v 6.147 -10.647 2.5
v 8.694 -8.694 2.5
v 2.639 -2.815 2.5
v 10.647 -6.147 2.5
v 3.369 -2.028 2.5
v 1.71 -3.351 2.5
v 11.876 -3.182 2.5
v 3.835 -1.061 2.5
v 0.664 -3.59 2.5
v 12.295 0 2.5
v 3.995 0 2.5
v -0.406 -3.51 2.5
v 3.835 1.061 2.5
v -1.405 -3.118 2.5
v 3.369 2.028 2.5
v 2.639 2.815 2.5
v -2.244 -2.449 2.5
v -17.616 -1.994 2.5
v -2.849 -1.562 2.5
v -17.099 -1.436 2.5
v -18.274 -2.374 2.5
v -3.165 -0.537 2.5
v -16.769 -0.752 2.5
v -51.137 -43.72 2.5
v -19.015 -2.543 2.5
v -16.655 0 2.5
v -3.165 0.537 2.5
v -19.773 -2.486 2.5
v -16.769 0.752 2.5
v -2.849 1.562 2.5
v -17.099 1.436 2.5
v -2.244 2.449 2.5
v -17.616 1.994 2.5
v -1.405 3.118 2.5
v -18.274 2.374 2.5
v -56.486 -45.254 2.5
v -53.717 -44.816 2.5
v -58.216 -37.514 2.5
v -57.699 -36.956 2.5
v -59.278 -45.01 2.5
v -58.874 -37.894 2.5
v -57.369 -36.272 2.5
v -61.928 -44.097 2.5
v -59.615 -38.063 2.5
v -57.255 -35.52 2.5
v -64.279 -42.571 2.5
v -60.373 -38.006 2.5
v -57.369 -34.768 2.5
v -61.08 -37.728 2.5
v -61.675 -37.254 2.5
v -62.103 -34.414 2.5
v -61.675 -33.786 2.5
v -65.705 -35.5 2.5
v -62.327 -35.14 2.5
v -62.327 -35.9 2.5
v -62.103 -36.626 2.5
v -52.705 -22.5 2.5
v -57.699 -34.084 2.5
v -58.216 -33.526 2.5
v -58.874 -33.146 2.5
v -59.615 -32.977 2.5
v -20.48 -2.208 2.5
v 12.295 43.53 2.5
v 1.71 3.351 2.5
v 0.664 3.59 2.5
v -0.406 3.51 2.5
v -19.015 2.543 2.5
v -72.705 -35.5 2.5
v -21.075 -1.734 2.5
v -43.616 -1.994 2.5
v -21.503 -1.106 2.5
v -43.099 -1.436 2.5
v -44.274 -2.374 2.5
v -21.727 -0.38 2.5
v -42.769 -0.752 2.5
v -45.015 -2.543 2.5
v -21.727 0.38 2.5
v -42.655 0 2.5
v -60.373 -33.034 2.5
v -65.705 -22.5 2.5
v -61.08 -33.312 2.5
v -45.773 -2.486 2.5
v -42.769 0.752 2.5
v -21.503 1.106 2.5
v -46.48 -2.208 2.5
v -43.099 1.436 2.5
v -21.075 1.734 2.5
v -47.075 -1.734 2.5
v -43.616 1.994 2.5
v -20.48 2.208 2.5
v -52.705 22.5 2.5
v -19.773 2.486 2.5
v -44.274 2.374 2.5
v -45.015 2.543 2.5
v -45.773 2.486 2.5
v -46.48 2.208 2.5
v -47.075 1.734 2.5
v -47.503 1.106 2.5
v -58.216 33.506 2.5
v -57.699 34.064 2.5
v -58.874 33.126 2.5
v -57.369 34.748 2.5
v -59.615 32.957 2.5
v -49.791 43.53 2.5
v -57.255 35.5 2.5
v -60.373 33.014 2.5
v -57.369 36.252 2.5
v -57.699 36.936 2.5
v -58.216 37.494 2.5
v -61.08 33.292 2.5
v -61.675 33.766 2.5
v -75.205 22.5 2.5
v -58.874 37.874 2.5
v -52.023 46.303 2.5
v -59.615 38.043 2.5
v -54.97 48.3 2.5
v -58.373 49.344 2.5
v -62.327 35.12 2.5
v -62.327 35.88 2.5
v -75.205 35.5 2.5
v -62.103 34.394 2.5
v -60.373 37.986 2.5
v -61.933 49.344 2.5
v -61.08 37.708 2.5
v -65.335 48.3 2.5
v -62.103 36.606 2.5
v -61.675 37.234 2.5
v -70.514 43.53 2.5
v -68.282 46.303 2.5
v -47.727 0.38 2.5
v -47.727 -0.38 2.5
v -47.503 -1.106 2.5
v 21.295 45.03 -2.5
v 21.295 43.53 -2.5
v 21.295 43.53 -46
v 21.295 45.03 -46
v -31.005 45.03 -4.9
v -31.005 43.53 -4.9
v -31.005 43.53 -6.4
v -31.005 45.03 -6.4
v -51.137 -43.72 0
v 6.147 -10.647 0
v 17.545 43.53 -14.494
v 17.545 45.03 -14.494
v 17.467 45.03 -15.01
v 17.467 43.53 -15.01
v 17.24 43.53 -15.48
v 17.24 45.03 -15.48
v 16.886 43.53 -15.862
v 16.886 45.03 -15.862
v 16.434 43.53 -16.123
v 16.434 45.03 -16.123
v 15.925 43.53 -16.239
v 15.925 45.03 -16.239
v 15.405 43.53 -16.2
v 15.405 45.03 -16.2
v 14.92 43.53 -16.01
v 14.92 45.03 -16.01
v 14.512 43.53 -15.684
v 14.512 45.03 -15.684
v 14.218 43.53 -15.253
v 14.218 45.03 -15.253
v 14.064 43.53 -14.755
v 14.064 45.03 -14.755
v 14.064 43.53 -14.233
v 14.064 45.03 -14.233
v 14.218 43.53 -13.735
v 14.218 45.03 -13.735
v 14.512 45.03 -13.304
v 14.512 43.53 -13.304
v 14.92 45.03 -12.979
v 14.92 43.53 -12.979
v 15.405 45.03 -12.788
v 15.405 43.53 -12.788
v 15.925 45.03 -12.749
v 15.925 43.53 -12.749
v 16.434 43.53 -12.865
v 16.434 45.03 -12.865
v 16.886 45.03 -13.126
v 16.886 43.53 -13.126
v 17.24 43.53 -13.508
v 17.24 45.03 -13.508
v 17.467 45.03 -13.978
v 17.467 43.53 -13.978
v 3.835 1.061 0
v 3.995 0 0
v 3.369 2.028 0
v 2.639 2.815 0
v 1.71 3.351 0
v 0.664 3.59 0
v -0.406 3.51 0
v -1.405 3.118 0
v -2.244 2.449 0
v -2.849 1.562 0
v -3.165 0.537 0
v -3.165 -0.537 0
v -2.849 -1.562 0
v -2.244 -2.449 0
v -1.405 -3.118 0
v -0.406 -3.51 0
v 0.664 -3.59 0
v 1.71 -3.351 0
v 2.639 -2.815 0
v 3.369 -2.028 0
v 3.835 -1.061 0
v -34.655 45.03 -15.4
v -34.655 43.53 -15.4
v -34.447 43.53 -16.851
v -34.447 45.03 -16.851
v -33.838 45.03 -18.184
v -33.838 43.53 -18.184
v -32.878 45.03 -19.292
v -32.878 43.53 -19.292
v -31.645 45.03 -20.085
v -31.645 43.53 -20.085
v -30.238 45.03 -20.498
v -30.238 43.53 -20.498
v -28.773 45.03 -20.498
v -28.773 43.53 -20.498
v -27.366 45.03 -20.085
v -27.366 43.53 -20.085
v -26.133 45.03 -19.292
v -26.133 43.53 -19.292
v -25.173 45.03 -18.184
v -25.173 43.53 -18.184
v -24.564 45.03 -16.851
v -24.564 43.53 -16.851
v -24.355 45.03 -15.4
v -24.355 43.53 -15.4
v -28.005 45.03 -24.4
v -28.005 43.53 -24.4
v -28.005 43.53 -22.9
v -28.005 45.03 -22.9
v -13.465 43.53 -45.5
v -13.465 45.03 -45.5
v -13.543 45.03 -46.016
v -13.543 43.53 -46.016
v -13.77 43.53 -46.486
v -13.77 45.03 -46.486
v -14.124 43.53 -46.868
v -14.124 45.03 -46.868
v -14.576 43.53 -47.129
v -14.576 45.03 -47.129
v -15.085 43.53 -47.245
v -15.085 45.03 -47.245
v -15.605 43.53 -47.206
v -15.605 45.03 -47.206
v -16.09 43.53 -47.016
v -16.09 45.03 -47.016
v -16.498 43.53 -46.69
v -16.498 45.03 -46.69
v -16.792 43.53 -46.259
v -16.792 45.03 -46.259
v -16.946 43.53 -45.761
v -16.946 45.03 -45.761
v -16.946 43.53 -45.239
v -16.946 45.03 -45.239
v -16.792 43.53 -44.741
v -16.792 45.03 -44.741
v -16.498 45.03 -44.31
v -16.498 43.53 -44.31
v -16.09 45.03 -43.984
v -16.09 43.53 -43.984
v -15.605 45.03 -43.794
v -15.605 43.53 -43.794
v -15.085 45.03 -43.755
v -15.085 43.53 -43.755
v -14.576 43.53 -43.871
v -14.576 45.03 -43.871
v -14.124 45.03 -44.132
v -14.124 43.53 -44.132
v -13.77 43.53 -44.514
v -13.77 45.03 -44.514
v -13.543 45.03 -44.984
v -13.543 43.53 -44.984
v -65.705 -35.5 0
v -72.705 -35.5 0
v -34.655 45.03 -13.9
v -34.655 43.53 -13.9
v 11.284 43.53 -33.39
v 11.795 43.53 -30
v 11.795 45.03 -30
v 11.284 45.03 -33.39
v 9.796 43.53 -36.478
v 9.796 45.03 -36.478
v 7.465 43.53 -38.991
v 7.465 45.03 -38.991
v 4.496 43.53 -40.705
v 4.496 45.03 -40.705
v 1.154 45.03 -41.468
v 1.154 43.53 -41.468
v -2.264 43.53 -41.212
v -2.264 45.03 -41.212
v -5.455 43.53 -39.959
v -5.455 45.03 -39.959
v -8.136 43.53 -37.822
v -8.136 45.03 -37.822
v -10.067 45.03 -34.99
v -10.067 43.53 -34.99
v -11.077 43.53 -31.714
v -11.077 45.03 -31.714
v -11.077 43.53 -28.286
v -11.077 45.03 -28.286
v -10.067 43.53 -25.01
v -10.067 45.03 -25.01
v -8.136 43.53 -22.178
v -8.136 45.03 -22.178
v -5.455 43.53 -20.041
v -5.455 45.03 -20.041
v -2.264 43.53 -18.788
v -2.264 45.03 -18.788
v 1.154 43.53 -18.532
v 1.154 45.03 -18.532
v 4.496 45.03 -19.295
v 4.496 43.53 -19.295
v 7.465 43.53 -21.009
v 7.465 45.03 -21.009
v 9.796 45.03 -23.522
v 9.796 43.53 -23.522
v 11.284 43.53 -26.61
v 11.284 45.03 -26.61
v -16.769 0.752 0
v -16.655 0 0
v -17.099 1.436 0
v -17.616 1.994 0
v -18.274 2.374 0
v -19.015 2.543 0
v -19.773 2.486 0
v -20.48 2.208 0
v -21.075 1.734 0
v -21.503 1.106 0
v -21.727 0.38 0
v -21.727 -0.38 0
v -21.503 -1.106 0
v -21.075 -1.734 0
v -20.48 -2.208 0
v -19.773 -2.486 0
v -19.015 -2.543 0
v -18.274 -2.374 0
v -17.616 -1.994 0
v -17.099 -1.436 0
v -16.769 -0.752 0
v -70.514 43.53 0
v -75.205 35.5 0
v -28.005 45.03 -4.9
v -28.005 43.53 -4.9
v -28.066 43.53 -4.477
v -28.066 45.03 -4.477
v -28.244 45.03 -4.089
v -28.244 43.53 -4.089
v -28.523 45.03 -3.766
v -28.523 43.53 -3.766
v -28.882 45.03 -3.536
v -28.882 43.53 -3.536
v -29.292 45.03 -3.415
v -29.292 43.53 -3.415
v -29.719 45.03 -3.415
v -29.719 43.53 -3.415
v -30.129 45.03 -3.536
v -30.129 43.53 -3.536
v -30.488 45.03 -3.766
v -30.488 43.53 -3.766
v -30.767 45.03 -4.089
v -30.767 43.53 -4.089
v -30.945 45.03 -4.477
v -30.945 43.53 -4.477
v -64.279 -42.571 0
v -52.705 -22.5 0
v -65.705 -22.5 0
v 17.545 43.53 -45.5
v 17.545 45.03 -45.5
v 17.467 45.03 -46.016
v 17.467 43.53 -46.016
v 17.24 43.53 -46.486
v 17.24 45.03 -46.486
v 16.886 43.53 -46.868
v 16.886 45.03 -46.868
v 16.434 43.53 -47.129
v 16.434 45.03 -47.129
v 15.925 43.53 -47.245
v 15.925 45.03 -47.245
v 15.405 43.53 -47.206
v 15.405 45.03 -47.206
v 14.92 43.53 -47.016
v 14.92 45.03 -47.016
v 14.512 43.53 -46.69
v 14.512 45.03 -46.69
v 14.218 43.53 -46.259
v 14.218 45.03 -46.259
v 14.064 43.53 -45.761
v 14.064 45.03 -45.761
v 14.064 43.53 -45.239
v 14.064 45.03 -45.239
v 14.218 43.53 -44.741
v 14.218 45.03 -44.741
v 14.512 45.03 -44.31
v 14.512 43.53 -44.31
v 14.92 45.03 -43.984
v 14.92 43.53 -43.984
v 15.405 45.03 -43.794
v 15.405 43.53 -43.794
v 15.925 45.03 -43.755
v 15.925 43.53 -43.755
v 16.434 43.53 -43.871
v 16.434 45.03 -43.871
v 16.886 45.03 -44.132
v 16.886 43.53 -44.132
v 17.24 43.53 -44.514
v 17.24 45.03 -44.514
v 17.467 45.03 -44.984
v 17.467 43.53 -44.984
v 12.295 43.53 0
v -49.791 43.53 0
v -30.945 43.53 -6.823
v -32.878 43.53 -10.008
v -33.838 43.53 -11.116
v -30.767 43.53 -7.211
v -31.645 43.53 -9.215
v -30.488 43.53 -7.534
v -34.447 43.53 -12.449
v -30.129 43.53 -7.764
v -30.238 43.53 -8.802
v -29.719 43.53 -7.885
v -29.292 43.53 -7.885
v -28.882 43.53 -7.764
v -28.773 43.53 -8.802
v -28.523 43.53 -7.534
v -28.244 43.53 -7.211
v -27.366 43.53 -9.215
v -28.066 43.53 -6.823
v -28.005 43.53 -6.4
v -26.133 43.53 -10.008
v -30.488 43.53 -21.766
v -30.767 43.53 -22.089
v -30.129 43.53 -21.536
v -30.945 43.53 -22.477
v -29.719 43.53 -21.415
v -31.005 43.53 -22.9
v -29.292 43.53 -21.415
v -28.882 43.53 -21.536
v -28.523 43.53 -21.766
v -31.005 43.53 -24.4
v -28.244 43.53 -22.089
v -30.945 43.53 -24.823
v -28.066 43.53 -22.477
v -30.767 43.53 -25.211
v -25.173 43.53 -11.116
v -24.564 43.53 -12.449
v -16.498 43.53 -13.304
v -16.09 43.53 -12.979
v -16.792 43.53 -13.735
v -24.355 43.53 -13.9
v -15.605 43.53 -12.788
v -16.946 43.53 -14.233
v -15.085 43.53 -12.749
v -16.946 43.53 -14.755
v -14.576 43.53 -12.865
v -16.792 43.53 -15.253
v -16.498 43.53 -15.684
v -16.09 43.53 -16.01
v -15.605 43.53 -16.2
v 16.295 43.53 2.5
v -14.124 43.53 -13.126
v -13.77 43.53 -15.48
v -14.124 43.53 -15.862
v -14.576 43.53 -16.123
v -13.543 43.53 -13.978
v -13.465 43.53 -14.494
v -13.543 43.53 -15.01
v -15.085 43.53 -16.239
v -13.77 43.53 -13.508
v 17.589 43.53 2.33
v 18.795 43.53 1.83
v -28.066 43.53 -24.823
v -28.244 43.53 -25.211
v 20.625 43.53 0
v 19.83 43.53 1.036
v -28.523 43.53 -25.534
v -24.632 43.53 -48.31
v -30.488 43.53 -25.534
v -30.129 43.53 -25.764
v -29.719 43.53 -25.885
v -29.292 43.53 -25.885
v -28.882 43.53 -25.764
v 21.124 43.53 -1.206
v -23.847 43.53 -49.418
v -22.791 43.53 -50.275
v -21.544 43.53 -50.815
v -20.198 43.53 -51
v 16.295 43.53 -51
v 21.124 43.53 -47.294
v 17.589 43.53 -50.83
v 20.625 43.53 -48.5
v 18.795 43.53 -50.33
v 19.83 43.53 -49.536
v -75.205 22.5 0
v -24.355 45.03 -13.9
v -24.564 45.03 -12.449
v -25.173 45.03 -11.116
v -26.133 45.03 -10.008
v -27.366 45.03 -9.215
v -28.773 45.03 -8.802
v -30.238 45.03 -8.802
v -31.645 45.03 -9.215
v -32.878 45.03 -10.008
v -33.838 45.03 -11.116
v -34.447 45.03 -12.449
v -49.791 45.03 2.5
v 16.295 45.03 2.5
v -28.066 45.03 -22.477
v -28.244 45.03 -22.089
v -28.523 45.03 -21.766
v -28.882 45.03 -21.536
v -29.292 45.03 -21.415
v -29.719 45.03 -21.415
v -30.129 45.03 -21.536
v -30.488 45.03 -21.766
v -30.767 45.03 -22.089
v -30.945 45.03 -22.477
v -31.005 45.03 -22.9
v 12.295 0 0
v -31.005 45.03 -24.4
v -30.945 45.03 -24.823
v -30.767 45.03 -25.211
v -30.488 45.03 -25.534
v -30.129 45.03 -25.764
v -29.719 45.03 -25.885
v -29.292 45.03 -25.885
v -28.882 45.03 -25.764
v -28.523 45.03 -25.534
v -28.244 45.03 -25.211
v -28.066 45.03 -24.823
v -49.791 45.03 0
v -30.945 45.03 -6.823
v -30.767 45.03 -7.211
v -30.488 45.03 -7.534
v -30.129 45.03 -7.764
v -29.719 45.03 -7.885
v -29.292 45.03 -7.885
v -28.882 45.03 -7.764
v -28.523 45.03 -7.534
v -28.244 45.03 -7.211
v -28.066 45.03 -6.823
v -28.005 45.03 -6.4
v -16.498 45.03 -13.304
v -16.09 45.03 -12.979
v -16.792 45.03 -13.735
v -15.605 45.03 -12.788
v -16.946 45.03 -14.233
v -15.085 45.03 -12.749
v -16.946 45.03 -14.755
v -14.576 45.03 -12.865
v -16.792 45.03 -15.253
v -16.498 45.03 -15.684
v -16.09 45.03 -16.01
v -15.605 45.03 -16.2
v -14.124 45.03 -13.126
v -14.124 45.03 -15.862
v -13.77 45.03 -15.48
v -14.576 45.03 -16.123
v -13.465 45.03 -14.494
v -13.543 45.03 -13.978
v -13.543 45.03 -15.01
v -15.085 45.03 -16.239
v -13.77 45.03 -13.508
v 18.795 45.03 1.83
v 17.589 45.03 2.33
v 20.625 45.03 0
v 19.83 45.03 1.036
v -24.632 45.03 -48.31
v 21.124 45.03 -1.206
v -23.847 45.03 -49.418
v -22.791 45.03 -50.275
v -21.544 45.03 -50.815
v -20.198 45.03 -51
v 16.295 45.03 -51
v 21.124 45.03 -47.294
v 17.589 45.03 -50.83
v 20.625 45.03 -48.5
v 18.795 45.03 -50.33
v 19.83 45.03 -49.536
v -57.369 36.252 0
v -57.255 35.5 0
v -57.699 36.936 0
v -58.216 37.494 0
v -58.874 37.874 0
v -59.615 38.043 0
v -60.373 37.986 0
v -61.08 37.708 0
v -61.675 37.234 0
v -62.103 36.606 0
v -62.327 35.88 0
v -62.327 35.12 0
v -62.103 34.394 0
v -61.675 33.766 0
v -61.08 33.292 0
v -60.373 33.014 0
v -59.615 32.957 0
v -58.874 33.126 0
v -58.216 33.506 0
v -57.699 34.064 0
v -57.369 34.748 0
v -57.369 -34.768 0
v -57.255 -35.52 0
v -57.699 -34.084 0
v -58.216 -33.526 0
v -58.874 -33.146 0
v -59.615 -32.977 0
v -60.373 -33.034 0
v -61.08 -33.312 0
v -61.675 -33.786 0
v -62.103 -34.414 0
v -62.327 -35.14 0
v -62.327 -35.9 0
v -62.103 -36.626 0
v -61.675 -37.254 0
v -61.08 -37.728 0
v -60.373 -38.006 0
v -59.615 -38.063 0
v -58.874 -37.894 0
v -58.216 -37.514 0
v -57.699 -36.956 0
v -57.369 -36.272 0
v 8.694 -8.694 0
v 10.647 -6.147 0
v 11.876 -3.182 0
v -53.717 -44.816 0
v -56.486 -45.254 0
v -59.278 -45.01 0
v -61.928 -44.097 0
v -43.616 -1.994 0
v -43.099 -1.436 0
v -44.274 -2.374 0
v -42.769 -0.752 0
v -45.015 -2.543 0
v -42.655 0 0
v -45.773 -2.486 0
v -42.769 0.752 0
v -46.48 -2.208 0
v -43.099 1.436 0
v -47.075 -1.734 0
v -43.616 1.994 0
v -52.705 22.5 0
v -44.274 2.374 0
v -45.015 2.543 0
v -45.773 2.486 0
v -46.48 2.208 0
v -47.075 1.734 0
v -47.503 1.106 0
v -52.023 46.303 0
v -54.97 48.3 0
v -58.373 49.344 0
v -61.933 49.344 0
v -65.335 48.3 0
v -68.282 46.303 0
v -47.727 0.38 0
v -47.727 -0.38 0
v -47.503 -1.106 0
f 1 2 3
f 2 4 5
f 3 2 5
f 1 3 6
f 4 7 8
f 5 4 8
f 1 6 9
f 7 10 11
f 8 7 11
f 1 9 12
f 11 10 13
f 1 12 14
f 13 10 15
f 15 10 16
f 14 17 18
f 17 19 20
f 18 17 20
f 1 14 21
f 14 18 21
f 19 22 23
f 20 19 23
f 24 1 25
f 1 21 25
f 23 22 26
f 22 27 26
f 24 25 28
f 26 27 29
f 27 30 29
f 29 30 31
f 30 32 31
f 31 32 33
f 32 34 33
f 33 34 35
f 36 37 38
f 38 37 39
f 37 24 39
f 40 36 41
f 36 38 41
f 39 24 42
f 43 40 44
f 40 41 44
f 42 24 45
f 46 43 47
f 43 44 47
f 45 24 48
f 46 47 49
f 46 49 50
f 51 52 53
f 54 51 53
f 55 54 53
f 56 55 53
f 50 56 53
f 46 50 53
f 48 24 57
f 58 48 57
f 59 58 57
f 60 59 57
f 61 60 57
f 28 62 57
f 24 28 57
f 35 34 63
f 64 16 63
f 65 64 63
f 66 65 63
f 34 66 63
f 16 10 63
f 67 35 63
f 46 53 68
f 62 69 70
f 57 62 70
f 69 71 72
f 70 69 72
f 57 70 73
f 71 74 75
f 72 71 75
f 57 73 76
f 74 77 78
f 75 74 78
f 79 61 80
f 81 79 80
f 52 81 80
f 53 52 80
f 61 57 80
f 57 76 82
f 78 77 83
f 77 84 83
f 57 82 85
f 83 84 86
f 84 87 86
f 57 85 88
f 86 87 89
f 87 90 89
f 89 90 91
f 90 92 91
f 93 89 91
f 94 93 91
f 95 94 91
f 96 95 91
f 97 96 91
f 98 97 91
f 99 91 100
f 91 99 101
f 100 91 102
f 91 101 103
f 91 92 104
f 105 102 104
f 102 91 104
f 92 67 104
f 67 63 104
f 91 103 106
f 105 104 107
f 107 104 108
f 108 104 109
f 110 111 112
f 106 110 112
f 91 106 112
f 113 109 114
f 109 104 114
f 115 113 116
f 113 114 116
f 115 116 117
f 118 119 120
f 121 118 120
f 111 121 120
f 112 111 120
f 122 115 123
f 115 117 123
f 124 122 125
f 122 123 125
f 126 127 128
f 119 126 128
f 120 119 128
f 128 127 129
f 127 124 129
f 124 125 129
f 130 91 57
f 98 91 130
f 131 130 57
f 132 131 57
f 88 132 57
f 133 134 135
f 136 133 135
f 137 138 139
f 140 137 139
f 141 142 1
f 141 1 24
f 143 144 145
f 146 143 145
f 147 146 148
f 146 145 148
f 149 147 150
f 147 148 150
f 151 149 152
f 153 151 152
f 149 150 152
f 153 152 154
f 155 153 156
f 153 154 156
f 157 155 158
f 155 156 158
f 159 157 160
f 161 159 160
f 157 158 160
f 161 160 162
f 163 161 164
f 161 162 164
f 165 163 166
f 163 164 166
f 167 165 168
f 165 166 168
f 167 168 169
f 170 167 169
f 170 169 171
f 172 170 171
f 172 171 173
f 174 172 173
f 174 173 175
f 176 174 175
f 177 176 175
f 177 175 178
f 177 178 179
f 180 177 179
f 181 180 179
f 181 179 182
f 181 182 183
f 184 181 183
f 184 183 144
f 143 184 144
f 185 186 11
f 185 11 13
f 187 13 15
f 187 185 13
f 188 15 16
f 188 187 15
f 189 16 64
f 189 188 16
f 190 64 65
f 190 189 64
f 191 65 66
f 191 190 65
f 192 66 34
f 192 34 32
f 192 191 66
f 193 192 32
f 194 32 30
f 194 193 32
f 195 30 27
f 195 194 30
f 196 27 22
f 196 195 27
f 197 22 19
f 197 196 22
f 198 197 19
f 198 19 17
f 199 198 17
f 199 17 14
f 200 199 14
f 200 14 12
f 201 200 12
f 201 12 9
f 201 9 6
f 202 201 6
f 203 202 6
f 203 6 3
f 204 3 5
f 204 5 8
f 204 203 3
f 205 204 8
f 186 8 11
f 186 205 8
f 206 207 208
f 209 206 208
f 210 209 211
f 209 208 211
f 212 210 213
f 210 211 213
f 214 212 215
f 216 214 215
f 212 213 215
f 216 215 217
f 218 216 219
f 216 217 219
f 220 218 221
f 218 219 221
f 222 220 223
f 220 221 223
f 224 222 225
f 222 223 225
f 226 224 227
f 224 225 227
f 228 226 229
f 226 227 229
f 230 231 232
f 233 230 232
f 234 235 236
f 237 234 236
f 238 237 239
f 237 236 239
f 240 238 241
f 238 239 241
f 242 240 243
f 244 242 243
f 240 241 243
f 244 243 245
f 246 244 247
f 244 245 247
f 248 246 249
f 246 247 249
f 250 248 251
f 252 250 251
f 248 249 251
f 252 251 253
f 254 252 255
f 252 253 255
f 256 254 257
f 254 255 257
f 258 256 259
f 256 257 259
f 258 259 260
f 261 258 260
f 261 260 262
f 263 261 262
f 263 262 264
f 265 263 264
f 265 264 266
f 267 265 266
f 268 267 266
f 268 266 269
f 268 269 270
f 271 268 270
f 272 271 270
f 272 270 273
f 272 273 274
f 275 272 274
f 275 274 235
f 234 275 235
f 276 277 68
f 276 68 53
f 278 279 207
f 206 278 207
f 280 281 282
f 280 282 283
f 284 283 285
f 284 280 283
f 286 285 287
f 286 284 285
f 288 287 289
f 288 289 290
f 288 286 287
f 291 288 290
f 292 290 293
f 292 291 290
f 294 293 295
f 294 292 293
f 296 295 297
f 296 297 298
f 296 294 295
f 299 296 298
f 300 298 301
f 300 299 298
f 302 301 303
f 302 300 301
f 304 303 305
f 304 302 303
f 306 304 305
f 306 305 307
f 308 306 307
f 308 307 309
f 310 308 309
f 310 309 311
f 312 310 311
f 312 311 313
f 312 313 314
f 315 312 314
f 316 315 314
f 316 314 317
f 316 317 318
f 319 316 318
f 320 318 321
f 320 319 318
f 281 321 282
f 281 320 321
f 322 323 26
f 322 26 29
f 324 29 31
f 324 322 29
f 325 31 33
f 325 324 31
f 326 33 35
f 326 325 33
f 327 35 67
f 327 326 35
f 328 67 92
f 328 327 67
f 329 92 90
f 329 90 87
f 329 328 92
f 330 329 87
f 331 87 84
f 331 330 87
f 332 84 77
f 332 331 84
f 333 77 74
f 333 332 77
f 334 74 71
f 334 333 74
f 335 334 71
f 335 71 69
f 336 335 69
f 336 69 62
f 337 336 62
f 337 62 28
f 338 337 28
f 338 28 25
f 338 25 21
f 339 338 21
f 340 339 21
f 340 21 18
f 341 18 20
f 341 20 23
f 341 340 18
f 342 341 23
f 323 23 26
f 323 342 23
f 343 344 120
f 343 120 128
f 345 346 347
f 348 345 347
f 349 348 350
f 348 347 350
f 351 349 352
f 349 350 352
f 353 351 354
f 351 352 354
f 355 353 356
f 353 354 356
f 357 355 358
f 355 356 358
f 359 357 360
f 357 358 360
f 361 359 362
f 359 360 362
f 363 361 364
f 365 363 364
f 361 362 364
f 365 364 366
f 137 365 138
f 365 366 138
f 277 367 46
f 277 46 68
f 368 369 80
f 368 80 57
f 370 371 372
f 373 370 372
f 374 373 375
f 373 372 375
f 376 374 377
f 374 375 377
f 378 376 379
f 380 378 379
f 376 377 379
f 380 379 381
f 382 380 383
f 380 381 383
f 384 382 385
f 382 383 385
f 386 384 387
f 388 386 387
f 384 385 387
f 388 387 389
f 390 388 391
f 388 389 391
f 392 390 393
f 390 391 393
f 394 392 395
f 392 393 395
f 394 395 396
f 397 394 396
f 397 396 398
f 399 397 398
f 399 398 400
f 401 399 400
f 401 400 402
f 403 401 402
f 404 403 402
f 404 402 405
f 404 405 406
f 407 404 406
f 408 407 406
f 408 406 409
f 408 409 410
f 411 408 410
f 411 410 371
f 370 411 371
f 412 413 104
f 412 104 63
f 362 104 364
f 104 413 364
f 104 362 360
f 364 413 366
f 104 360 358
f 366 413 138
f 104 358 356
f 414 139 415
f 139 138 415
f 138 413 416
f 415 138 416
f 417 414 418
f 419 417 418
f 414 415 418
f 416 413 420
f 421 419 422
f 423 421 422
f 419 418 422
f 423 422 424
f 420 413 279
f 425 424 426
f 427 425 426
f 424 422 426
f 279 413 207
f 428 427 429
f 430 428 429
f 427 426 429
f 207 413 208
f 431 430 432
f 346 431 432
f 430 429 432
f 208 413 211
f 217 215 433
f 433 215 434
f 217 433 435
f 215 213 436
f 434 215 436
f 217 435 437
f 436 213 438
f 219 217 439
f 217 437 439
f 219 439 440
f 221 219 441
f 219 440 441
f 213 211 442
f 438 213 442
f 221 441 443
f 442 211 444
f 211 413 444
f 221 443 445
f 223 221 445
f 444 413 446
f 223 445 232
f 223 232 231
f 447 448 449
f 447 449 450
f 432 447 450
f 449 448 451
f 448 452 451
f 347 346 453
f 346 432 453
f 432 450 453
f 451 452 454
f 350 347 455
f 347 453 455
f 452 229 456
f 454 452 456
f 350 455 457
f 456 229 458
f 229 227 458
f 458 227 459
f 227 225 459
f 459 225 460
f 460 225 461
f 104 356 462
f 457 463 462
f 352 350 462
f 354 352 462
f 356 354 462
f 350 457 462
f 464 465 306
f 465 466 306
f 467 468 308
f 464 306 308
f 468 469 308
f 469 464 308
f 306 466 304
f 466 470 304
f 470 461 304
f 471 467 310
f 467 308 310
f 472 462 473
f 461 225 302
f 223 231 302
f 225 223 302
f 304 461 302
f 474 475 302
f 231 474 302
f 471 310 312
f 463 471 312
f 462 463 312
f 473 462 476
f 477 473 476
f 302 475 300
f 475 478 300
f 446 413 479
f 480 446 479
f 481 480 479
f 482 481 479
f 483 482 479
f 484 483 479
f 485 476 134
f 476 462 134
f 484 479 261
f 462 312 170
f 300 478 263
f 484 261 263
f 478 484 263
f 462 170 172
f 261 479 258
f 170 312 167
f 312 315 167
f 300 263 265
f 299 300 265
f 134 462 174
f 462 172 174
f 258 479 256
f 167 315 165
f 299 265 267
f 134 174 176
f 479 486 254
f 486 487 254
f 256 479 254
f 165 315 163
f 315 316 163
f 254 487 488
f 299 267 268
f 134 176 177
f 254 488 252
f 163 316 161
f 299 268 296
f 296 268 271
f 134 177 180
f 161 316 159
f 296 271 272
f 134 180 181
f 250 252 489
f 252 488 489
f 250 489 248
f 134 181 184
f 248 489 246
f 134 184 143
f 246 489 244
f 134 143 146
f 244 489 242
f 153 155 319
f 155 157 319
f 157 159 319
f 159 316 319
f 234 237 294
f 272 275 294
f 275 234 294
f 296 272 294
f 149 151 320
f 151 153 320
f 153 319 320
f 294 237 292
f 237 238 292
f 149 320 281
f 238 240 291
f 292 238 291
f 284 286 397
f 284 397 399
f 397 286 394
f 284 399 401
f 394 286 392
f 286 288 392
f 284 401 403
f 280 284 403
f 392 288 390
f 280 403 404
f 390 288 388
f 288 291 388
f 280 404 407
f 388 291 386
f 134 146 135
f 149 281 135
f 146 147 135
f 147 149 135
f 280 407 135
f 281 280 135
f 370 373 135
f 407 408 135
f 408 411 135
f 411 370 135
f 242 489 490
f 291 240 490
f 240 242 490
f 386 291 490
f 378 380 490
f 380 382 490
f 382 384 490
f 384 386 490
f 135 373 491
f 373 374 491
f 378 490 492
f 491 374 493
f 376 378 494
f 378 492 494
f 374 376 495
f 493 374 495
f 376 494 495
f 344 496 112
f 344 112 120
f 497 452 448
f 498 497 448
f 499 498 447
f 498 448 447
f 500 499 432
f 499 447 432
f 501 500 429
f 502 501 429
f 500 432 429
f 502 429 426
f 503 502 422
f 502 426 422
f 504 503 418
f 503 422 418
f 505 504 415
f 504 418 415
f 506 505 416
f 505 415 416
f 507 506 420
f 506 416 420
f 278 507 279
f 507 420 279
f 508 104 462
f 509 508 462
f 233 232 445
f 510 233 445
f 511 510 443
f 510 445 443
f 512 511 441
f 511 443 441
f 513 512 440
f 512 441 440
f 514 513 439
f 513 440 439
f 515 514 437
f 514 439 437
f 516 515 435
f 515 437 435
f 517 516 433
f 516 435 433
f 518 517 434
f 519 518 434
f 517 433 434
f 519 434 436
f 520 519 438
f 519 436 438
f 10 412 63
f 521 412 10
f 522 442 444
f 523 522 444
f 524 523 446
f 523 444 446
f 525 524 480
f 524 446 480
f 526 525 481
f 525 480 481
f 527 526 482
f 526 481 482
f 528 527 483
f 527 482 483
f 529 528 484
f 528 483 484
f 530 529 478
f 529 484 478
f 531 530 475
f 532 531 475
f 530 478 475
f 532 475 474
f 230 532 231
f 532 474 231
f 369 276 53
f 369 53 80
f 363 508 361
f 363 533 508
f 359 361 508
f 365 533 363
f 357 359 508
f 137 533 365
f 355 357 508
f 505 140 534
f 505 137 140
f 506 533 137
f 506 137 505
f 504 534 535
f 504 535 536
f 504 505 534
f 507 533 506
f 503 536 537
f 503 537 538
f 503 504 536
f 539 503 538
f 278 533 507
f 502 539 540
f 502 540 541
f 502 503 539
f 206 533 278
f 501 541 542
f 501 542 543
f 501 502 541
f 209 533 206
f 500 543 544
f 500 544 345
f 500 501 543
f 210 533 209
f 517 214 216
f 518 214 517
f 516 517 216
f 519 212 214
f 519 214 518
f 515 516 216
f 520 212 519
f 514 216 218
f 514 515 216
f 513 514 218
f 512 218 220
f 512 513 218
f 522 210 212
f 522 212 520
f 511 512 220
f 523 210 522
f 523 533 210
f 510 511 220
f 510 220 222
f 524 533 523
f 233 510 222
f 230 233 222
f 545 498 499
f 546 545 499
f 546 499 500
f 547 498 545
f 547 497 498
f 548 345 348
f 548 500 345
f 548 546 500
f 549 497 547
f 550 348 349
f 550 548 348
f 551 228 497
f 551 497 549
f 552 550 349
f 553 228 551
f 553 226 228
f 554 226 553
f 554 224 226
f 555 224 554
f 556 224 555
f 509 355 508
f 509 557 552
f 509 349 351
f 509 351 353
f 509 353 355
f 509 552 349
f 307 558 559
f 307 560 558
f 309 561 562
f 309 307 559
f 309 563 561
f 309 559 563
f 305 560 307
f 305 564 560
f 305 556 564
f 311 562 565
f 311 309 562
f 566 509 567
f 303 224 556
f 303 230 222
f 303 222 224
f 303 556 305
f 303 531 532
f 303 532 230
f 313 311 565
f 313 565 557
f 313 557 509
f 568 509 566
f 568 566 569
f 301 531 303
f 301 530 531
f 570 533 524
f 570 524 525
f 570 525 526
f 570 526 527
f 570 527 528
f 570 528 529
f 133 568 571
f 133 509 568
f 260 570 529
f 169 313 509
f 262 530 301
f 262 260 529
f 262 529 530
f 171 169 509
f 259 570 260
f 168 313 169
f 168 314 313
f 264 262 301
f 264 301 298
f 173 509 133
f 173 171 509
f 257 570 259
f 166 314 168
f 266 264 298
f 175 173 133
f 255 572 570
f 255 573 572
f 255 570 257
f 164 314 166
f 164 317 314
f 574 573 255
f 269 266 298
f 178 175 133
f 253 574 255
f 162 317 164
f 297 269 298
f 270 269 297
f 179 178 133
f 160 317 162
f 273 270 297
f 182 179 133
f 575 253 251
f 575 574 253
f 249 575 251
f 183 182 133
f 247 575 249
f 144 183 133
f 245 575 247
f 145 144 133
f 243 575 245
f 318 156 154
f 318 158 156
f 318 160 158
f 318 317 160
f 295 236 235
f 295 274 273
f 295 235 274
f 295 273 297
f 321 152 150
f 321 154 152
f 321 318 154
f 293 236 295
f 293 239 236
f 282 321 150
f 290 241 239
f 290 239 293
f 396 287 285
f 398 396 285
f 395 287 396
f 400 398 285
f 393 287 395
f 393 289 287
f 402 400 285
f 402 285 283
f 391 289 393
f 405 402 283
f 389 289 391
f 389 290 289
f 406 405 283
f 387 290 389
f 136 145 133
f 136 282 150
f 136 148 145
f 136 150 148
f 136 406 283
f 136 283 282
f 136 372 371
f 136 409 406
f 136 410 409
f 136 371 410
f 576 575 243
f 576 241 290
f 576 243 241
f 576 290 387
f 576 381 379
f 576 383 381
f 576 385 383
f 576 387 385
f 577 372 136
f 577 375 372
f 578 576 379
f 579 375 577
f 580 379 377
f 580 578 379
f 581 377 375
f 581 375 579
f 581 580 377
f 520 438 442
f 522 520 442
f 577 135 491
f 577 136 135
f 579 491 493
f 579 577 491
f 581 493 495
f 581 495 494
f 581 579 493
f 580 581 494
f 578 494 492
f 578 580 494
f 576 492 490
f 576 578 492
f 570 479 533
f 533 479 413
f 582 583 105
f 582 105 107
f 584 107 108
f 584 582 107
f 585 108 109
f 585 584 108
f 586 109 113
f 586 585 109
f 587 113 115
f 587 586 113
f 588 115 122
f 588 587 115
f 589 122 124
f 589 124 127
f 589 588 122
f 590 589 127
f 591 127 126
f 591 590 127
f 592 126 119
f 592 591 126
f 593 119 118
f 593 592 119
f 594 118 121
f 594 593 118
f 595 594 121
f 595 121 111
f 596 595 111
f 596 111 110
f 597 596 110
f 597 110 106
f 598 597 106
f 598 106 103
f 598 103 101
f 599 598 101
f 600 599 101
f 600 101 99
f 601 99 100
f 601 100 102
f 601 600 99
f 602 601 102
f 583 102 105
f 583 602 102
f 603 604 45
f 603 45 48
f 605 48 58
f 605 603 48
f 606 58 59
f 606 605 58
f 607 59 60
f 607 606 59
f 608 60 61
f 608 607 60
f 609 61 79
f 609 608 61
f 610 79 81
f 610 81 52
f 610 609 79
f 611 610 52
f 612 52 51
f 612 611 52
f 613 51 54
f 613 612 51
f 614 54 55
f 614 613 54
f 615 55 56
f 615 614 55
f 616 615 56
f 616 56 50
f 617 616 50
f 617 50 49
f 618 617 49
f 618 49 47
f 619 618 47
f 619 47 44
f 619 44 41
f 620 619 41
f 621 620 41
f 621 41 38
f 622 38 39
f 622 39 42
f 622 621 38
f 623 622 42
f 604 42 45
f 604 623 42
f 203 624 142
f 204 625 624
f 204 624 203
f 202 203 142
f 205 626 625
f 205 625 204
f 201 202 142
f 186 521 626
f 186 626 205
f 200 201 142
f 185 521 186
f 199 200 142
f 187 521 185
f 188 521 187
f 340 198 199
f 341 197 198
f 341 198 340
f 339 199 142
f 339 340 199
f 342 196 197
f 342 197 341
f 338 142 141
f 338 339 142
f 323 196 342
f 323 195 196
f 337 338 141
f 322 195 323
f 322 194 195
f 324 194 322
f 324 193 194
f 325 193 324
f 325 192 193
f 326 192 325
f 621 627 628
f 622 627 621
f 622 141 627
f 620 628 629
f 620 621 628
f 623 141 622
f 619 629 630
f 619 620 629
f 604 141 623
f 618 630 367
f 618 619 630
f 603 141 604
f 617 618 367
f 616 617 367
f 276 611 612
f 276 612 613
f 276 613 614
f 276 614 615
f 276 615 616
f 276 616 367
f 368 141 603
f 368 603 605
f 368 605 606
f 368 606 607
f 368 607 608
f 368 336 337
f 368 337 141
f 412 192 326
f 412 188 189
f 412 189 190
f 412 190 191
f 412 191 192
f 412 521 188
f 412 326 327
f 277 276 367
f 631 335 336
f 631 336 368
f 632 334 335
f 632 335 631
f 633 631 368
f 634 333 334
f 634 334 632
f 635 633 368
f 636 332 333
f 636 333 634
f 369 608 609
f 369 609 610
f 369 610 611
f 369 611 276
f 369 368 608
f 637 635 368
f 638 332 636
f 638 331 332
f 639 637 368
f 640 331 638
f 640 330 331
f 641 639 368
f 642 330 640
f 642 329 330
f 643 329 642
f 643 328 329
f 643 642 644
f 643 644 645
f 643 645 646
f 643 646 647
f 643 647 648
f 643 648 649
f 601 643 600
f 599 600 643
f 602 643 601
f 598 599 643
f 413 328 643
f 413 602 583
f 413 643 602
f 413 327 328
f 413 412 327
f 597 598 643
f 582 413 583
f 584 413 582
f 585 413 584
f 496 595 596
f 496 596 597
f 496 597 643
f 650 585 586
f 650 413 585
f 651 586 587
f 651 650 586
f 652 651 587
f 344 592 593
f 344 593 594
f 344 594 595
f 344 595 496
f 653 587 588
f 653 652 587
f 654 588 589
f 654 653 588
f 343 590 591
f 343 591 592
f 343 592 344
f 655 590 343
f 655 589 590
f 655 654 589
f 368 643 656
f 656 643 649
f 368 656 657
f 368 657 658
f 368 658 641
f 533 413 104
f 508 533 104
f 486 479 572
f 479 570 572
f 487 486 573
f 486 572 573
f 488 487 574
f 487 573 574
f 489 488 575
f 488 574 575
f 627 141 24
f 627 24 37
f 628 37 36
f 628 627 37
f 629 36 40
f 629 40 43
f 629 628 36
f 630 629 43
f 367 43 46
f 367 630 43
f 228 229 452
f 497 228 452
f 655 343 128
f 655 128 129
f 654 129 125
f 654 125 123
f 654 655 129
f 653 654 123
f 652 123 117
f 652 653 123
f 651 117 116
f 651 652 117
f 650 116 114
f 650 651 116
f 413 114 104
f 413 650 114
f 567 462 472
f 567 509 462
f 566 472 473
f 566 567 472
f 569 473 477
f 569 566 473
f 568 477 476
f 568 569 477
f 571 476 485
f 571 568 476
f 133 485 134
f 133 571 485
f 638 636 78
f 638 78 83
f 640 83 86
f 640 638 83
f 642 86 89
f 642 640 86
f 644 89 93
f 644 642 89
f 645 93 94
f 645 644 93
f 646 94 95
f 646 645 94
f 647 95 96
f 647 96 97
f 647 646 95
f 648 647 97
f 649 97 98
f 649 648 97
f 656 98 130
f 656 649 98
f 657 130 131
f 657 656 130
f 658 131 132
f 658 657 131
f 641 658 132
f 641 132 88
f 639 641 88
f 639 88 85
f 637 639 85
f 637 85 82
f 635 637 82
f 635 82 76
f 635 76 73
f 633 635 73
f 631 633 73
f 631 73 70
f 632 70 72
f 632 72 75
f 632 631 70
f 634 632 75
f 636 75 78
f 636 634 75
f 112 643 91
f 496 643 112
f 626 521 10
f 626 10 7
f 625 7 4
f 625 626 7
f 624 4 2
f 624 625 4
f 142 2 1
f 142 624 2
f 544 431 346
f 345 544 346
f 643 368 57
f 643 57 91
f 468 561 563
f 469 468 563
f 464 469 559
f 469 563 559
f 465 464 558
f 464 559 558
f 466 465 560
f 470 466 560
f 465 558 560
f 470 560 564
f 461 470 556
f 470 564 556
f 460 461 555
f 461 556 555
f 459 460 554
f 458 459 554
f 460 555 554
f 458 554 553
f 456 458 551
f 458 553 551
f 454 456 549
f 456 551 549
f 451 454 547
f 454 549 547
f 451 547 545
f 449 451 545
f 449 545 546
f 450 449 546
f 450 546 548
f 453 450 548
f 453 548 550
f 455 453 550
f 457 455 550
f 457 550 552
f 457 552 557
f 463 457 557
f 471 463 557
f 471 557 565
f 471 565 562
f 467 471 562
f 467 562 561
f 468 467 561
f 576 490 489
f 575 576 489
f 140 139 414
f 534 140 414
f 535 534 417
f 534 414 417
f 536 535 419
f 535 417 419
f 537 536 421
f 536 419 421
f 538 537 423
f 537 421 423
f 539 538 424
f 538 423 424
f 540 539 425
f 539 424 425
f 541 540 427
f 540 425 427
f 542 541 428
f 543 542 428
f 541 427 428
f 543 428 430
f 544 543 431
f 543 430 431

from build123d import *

# Parameters (mm, degrees)
SKETCH1_R           = 2.55
SKETCH1_R_2         = 3.6
BOSS_EXTRUDE1_DEPTH = 2.5
SKETCH3_R           = 11.5
BOSS_EXTRUDE2_DEPTH = 1.5
SKETCH5_R           = 1.75
CUT_EXTRUDE1_DEPTH  = 91.291152611
FILLET1_R           = 5


with BuildPart() as part:
    # Sketch1 → Boss-Extrude1 (new body)
    with BuildSketch(Plane.XY):
        with BuildLine():
            Line((-75.205421971, 35.5), (-70.514036248, 43.53))
            ThreePointArc((-70.514036248, 43.53), (-60.152745925, 49.476599067), (-49.791455603, 43.53))
            Line((-49.791455603, 43.53), (12.294578029, 43.53))
            Line((12.294578029, 43.53), (12.294578029, 0))
            ThreePointArc((12.294578029, 0), (10.647416902, -6.147289015), (6.147289015, -10.647416902))
            Line((6.147289015, -10.647416902), (-51.136875585, -43.720444754))
            ThreePointArc((-51.136875585, -43.720444754), (-57.889166626, -45.217391639), (-64.278933096, -42.570663707))
            Line((-64.278933096, -42.570663707), (-72.705421971, -35.5))
            Line((-72.705421971, -35.5), (-65.705421971, -35.5))
            Line((-65.705421971, -35.5), (-65.705421971, -22.5))
            Line((-65.705421971, -22.5), (-52.705421971, -22.5))
            Line((-52.705421971, -22.5), (-52.705421971, 22.5))
            Line((-52.705421971, 22.5), (-75.205421971, 22.5))
            Line((-75.205421971, 22.5), (-75.205421971, 35.5))
        make_face()
        with Locations((-59.805421971, 35.5)):
            Circle(SKETCH1_R, mode=Mode.SUBTRACT)
        with Locations((-59.805421971, -35.52)):
            Circle(SKETCH1_R, mode=Mode.SUBTRACT)
        with Locations((-45.205421971, 0)):
            Circle(SKETCH1_R, mode=Mode.SUBTRACT)
        with Locations((-19.205421971, 0)):
            Circle(SKETCH1_R, mode=Mode.SUBTRACT)
        with Locations((0.394578029, 0)):
            Circle(SKETCH1_R_2, mode=Mode.SUBTRACT)
    extrude(amount=BOSS_EXTRUDE1_DEPTH)


with BuildPart() as body_2:
    # Sketch3 → Boss-Extrude2 (new body)
    with BuildSketch(Plane(origin=(0, 43.53, 0), x_dir=(1, 0, 0), z_dir=(0, 1, 0))):
        Polygon((-49.791455603, -2.5), (21.294578029, -2.5), (21.294578029, 51), (-23.231221686, 51), (-49.791455603, 0), align=None)
        with Locations((0.294578029, 30)):
            Circle(SKETCH3_R, mode=Mode.SUBTRACT)
        with BuildLine():
            Line((-24.355421971, 15.4), (-24.355421971, 13.9))
            ThreePointArc((-24.355421971, 13.9), (-29.505421971, 8.75), (-34.655421971, 13.9))
            Line((-34.655421971, 13.9), (-34.655421971, 15.4))
            ThreePointArc((-34.655421971, 15.4), (-29.505421971, 20.55), (-24.355421971, 15.4))
        make_face(mode=Mode.SUBTRACT)
        with BuildLine():
            Line((-28.005421971, 24.4), (-28.005421971, 22.9))
            ThreePointArc((-28.005421971, 22.9), (-29.505421971, 21.4), (-31.005421971, 22.9))
            Line((-31.005421971, 22.9), (-31.005421971, 24.4))
            ThreePointArc((-31.005421971, 24.4), (-29.505421971, 25.9), (-28.005421971, 24.4))
        make_face(mode=Mode.SUBTRACT)
        with BuildLine():
            Line((-28.005421971, 6.4), (-28.005421971, 4.9))
            ThreePointArc((-28.005421971, 4.9), (-29.505421971, 3.4), (-31.005421971, 4.9))
            Line((-31.005421971, 4.9), (-31.005421971, 6.4))
            ThreePointArc((-31.005421971, 6.4), (-29.505421971, 7.9), (-28.005421971, 6.4))
        make_face(mode=Mode.SUBTRACT)
    extrude(amount=BOSS_EXTRUDE2_DEPTH)

    # Sketch5 → Cut-Extrude1 (cut, through all)
    with BuildSketch(Plane(origin=(0, 45.03, 0), x_dir=(1, 0, 0), z_dir=(0, 1, 0))):
        with Locations((-15.215421971, 45.5)):
            Circle(SKETCH5_R)
        with Locations((-15.215421971, 14.49409974)):
            Circle(SKETCH5_R)
        with Locations((15.794578029, 45.5)):
            Circle(SKETCH5_R)
        with Locations((15.794578029, 14.49409974)):
            Circle(SKETCH5_R)
    extrude(amount=-CUT_EXTRUDE1_DEPTH, mode=Mode.SUBTRACT)

    # Fillet1
    fillet1_edges = [body_2.edges().sort_by_distance(p)[0] for p in [
        (-23.231221686, 44.28, -51),
        (21.294578029, 44.28, -51),
        (21.294578029, 44.28, 2.5),
    ]]
    fillet(fillet1_edges, radius=FILLET1_R)


solid = Compound([part.part, body_2.part])
